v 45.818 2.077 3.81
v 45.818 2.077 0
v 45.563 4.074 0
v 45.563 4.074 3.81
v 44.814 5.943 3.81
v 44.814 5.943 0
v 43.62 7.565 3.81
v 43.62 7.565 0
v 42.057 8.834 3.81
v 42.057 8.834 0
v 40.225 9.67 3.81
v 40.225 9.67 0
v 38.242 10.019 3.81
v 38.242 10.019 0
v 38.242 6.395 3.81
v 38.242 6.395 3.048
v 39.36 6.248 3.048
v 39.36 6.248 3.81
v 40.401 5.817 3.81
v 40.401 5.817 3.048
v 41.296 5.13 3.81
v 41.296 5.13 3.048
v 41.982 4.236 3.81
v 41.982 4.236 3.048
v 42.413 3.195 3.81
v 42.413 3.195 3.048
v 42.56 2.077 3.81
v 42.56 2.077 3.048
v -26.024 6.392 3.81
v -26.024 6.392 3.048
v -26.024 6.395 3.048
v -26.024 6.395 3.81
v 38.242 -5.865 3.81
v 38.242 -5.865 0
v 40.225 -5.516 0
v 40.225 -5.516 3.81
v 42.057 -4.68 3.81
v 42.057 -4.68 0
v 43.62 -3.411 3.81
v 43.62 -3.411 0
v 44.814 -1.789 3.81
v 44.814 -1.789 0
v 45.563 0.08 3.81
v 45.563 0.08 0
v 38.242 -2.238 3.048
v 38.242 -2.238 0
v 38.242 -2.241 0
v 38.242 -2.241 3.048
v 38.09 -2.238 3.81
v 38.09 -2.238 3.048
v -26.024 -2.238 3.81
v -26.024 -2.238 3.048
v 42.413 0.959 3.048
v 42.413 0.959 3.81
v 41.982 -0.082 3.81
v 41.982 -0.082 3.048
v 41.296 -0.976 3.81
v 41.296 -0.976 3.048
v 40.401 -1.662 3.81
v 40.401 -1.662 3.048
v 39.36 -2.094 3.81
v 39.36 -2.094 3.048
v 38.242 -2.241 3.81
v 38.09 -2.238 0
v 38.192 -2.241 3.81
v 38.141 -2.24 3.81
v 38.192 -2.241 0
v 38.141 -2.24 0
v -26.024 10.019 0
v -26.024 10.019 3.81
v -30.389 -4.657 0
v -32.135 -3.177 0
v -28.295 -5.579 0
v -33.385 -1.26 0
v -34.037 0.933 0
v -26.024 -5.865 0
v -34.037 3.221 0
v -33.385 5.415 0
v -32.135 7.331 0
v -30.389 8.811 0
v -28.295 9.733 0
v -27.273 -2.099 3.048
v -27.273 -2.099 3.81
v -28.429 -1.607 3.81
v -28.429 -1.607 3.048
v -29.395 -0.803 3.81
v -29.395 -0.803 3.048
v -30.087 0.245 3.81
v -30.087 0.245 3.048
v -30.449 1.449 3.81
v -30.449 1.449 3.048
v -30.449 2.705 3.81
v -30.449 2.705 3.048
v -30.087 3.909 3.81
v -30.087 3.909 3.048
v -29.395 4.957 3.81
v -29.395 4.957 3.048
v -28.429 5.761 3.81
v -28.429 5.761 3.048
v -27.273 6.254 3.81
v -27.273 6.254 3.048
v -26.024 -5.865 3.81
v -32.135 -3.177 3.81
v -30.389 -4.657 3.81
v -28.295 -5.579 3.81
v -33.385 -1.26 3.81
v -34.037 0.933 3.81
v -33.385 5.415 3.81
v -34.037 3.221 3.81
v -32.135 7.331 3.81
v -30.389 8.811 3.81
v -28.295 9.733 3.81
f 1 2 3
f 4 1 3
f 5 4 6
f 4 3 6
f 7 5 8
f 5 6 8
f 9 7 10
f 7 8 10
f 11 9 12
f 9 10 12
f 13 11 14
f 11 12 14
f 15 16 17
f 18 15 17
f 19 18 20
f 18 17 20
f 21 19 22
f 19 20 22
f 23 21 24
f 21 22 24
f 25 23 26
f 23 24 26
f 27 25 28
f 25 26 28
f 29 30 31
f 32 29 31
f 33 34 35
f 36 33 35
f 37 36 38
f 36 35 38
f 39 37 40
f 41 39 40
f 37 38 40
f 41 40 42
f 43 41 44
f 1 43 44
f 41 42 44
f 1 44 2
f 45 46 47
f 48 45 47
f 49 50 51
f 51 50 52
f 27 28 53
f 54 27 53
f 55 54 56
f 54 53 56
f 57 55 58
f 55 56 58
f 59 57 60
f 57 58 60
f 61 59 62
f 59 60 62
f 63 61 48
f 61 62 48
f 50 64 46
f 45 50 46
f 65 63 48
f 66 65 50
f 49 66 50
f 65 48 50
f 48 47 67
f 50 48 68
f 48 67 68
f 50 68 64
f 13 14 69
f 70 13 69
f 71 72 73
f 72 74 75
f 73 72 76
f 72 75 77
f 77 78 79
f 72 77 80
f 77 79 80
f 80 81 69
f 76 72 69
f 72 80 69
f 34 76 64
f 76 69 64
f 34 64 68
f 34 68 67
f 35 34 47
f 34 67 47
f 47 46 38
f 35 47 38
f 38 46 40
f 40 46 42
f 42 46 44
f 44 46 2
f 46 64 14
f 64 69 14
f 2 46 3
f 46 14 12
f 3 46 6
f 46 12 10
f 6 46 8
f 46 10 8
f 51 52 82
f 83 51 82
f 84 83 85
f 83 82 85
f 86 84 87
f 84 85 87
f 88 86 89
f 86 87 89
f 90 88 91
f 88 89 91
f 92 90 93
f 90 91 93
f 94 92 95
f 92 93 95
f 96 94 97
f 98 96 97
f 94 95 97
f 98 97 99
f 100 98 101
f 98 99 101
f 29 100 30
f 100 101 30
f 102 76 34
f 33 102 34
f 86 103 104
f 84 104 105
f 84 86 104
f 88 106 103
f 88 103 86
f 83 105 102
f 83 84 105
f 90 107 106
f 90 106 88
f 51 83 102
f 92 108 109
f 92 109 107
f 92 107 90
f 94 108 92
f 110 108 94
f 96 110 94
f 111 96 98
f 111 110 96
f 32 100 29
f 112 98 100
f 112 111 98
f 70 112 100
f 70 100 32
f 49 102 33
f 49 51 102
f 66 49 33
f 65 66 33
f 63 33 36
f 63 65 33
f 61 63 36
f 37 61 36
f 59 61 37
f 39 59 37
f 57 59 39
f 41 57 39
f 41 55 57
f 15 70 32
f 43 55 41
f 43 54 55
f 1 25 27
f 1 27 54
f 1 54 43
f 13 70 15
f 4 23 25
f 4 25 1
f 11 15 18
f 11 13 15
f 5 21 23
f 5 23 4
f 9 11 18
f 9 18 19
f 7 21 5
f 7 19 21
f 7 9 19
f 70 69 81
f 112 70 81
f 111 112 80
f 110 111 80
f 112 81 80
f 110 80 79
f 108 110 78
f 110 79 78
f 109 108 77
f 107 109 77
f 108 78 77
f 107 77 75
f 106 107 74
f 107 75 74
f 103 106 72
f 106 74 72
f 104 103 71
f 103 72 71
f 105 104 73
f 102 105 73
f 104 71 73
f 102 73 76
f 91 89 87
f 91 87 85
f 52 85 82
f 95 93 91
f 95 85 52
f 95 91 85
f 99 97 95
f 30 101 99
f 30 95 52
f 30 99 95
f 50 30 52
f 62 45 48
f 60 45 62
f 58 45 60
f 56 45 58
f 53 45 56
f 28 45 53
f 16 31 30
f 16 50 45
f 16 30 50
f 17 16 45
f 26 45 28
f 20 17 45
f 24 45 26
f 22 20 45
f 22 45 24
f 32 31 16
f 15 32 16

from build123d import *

# Parameters (mm, degrees)
F1_DEPTH = 3.81
F2_DEPTH = 3.048


with BuildPart() as f1:
    # F0 (on Top) → F1 (new body)
    with BuildSketch(Plane.XY):
        with BuildLine():
            ThreePointArc((-19.510121746, 6.3950662109), (-22.3157867582, 9.0185520845), (-26.0244197252, 10.0187899587))
            Line((-26.0244197252, 10.0187899587), (-26.0244197252, 6.3950662109))
            Line((-26.0244197252, 6.3950662109), (-19.510121746, 6.3950662109))
        make_face()
        with BuildLine():
            Line((-26.0244197252, 6.3950662109), (-26.0244197252, 10.0187899587))
            ThreePointArc((-26.0244197252, 10.0187899587), (-34.1203354035, 2.0770662109), (-26.0244197252, -5.8646575368))
            Line((-26.0244197252, -5.8646575368), (-26.0244197252, -2.2382320992))
            ThreePointArc((-26.0244197252, -2.2382320992), (-30.4951433134, 2.0770662109), (-26.0244197252, 6.3923645211))
            Line((-26.0244197252, 6.3923645211), (-26.0244197252, 6.3950662109))
        make_face()
        with BuildLine():
            Line((37.4916443036, 10.0187899587), (-26.0244197252, 10.0187899587))
            ThreePointArc((-26.0244197252, 10.0187899587), (-22.3157867582, 9.0185520845), (-19.510121746, 6.3950662109))
            Line((-19.510121746, 6.3950662109), (31.1912137245, 6.3950662109))
            ThreePointArc((31.1912137245, 6.3950662109), (33.9031065879, 8.9690226069), (37.4916443036, 10.0187899587))
        make_face()
        with BuildLine():
            Line((38.2424543545, 10.0187899587), (37.4916443036, 10.0187899587))
            ThreePointArc((37.4916443036, 10.0187899587), (33.9031065879, 8.9690226069), (31.1912137245, 6.3950662109))
            Line((31.1912137245, 6.3950662109), (38.2424543545, 6.3950662109))
            Line((38.2424543545, 6.3950662109), (38.2424543545, 10.0187899587))
        make_face()
        with BuildLine():
            ThreePointArc((-19.5083727315, -2.2382320992), (-22.3143805661, -4.8636372504), (-26.0244197252, -5.8646575368))
            Line((-26.0244197252, -5.8646575368), (37.4916443036, -5.8646575368))
            ThreePointArc((37.4916443036, -5.8646575368), (33.9017122748, -4.8140880512), (31.1894670186, -2.2382320992))
            Line((31.1894670186, -2.2382320992), (-19.5083727315, -2.2382320992))
        make_face()
        with BuildLine():
            Line((-26.0244197252, -2.2382320992), (-26.0244197252, -5.8646575368))
            ThreePointArc((-26.0244197252, -5.8646575368), (-22.3143805661, -4.8636372504), (-19.5083727315, -2.2382320992))
            Line((-19.5083727315, -2.2382320992), (-26.0244197252, -2.2382320992))
        make_face()
        with BuildLine():
            ThreePointArc((45.8176408176, 2.0770662109), (43.6201614007, 7.5646527942), (38.2424543545, 10.0187899587))
            Line((38.2424543545, 10.0187899587), (38.2424543545, 6.3950662109))
            ThreePointArc((38.2424543545, 6.3950662109), (41.2957414356, 5.1303532921), (42.5604543545, 2.0770662109))
            ThreePointArc((42.5604543545, 2.0770662109), (41.2957414356, -0.9762208702), (38.2424543545, -2.2409337891))
            Line((38.2424543545, -2.2409337891), (38.2424543545, -5.8646575368))
            ThreePointArc((38.2424543545, -5.8646575368), (43.6201614007, -3.4105203724), (45.8176408176, 2.0770662109))
        make_face()
        with BuildLine():
            ThreePointArc((31.1894670186, -2.2382320992), (33.9017122748, -4.8140880512), (37.4916443036, -5.8646575368))
            Line((37.4916443036, -5.8646575368), (38.2424543545, -5.8646575368))
            Line((38.2424543545, -5.8646575368), (38.2424543545, -2.2409337891))
            ThreePointArc((38.2424543545, -2.2409337891), (38.1660806131, -2.2402583138), (38.0897307663, -2.2382320992))
            Line((38.0897307663, -2.2382320992), (31.1894670186, -2.2382320992))
        make_face()
    extrude(amount=F1_DEPTH)

    # F0 (on Top) → F2 (join)
    with BuildSketch(Plane.XY):
        with BuildLine():
            Line((37.4916443036, 10.0187899587), (-26.0244197252, 10.0187899587))
            ThreePointArc((-26.0244197252, 10.0187899587), (-22.3157867582, 9.0185520845), (-19.510121746, 6.3950662109))
            Line((-19.510121746, 6.3950662109), (31.1912137245, 6.3950662109))
            ThreePointArc((31.1912137245, 6.3950662109), (33.9031065879, 8.9690226069), (37.4916443036, 10.0187899587))
        make_face()
        with BuildLine():
            Line((31.1912137245, 6.3950662109), (-19.510121746, 6.3950662109))
            ThreePointArc((-19.510121746, 6.3950662109), (-18.5596721596, 4.3283844472), (-18.2339512233, 2.0770662109))
            ThreePointArc((-18.2339512233, 2.0770662109), (-18.5592162228, -0.1727087604), (-19.5083727315, -2.2382320992))
            Line((-19.5083727315, -2.2382320992), (31.1894670186, -2.2382320992))
            ThreePointArc((31.1894670186, -2.2382320992), (29.9164580032, 2.0786747903), (31.1912137245, 6.3950662109))
        make_face()
        with BuildLine():
            Line((38.2424543545, 10.0187899587), (37.4916443036, 10.0187899587))
            ThreePointArc((37.4916443036, 10.0187899587), (33.9031065879, 8.9690226069), (31.1912137245, 6.3950662109))
            Line((31.1912137245, 6.3950662109), (38.2424543545, 6.3950662109))
            Line((38.2424543545, 6.3950662109), (38.2424543545, 10.0187899587))
        make_face()
        with BuildLine():
            Line((38.2424543545, 6.3950662109), (31.1912137245, 6.3950662109))
            ThreePointArc((31.1912137245, 6.3950662109), (29.9164580032, 2.0786747903), (31.1894670186, -2.2382320992))
            Line((31.1894670186, -2.2382320992), (38.0897307663, -2.2382320992))
            ThreePointArc((38.0897307663, -2.2382320992), (33.9251298298, 2.1534399524), (38.2424543545, 6.3950662109))
        make_face()
        with BuildLine():
            Line((38.2424543545, -2.2382320992), (38.2424543545, 6.3950662109))
            ThreePointArc((38.2424543545, 6.3950662109), (33.9251298298, 2.1534399524), (38.0897307663, -2.2382320992))
            Line((38.0897307663, -2.2382320992), (38.2424543545, -2.2382320992))
        make_face()
        with BuildLine():
            ThreePointArc((42.5604543545, 2.0770662109), (41.2957414356, 5.1303532921), (38.2424543545, 6.3950662109))
            Line((38.2424543545, 6.3950662109), (38.2424543545, -2.2382320992))
            Line((38.2424543545, -2.2382320992), (38.2424543545, -2.2409337891))
            ThreePointArc((38.2424543545, -2.2409337891), (41.2957414356, -0.9762208702), (42.5604543545, 2.0770662109))
        make_face()
        with BuildLine():
            ThreePointArc((45.8176408176, 2.0770662109), (43.6201614007, 7.5646527942), (38.2424543545, 10.0187899587))
            Line((38.2424543545, 10.0187899587), (38.2424543545, 6.3950662109))
            ThreePointArc((38.2424543545, 6.3950662109), (41.2957414356, 5.1303532921), (42.5604543545, 2.0770662109))
            ThreePointArc((42.5604543545, 2.0770662109), (41.2957414356, -0.9762208702), (38.2424543545, -2.2409337891))
            Line((38.2424543545, -2.2409337891), (38.2424543545, -5.8646575368))
            ThreePointArc((38.2424543545, -5.8646575368), (43.6201614007, -3.4105203724), (45.8176408176, 2.0770662109))
        make_face()
        with BuildLine():
            ThreePointArc((31.1894670186, -2.2382320992), (33.9017122748, -4.8140880512), (37.4916443036, -5.8646575368))
            Line((37.4916443036, -5.8646575368), (38.2424543545, -5.8646575368))
            Line((38.2424543545, -5.8646575368), (38.2424543545, -2.2409337891))
            ThreePointArc((38.2424543545, -2.2409337891), (38.1660806131, -2.2402583138), (38.0897307663, -2.2382320992))
            Line((38.0897307663, -2.2382320992), (31.1894670186, -2.2382320992))
        make_face()
        with BuildLine():
            ThreePointArc((-19.5083727315, -2.2382320992), (-22.3143805661, -4.8636372504), (-26.0244197252, -5.8646575368))
            Line((-26.0244197252, -5.8646575368), (37.4916443036, -5.8646575368))
            ThreePointArc((37.4916443036, -5.8646575368), (33.9017122748, -4.8140880512), (31.1894670186, -2.2382320992))
            Line((31.1894670186, -2.2382320992), (-19.5083727315, -2.2382320992))
        make_face()
        with BuildLine():
            Line((-19.510121746, 6.3950662109), (-26.0244197252, 6.3950662109))
            Line((-26.0244197252, 6.3950662109), (-26.0244197252, 6.3923645211))
            ThreePointArc((-26.0244197252, 6.3923645211), (-23.0703294749, 5.0758712685), (-21.8591433134, 2.0770662109))
            ThreePointArc((-21.8591433134, 2.0770662109), (-23.0703294749, -0.9217388466), (-26.0244197252, -2.2382320992))
            Line((-26.0244197252, -2.2382320992), (-19.5083727315, -2.2382320992))
            ThreePointArc((-19.5083727315, -2.2382320992), (-18.5592162228, -0.1727087604), (-18.2339512233, 2.0770662109))
            ThreePointArc((-18.2339512233, 2.0770662109), (-18.5596721596, 4.3283844472), (-19.510121746, 6.3950662109))
        make_face()
        with BuildLine():
            Line((-26.0244197252, -2.2382320992), (-26.0244197252, 6.3923645211))
            ThreePointArc((-26.0244197252, 6.3923645211), (-30.4951433134, 2.0770662109), (-26.0244197252, -2.2382320992))
        make_face()
        with BuildLine():
            ThreePointArc((-21.8591433134, 2.0770662109), (-23.0703294749, 5.0758712685), (-26.0244197252, 6.3923645211))
            Line((-26.0244197252, 6.3923645211), (-26.0244197252, -2.2382320992))
            ThreePointArc((-26.0244197252, -2.2382320992), (-23.0703294749, -0.9217388466), (-21.8591433134, 2.0770662109))
        make_face()
        with BuildLine():
            ThreePointArc((-19.510121746, 6.3950662109), (-22.3157867582, 9.0185520845), (-26.0244197252, 10.0187899587))
            Line((-26.0244197252, 10.0187899587), (-26.0244197252, 6.3950662109))
            Line((-26.0244197252, 6.3950662109), (-19.510121746, 6.3950662109))
        make_face()
        with BuildLine():
            Line((-26.0244197252, -2.2382320992), (-26.0244197252, -5.8646575368))
            ThreePointArc((-26.0244197252, -5.8646575368), (-22.3143805661, -4.8636372504), (-19.5083727315, -2.2382320992))
            Line((-19.5083727315, -2.2382320992), (-26.0244197252, -2.2382320992))
        make_face()
    extrude(amount=F2_DEPTH)


solid = f1.part
